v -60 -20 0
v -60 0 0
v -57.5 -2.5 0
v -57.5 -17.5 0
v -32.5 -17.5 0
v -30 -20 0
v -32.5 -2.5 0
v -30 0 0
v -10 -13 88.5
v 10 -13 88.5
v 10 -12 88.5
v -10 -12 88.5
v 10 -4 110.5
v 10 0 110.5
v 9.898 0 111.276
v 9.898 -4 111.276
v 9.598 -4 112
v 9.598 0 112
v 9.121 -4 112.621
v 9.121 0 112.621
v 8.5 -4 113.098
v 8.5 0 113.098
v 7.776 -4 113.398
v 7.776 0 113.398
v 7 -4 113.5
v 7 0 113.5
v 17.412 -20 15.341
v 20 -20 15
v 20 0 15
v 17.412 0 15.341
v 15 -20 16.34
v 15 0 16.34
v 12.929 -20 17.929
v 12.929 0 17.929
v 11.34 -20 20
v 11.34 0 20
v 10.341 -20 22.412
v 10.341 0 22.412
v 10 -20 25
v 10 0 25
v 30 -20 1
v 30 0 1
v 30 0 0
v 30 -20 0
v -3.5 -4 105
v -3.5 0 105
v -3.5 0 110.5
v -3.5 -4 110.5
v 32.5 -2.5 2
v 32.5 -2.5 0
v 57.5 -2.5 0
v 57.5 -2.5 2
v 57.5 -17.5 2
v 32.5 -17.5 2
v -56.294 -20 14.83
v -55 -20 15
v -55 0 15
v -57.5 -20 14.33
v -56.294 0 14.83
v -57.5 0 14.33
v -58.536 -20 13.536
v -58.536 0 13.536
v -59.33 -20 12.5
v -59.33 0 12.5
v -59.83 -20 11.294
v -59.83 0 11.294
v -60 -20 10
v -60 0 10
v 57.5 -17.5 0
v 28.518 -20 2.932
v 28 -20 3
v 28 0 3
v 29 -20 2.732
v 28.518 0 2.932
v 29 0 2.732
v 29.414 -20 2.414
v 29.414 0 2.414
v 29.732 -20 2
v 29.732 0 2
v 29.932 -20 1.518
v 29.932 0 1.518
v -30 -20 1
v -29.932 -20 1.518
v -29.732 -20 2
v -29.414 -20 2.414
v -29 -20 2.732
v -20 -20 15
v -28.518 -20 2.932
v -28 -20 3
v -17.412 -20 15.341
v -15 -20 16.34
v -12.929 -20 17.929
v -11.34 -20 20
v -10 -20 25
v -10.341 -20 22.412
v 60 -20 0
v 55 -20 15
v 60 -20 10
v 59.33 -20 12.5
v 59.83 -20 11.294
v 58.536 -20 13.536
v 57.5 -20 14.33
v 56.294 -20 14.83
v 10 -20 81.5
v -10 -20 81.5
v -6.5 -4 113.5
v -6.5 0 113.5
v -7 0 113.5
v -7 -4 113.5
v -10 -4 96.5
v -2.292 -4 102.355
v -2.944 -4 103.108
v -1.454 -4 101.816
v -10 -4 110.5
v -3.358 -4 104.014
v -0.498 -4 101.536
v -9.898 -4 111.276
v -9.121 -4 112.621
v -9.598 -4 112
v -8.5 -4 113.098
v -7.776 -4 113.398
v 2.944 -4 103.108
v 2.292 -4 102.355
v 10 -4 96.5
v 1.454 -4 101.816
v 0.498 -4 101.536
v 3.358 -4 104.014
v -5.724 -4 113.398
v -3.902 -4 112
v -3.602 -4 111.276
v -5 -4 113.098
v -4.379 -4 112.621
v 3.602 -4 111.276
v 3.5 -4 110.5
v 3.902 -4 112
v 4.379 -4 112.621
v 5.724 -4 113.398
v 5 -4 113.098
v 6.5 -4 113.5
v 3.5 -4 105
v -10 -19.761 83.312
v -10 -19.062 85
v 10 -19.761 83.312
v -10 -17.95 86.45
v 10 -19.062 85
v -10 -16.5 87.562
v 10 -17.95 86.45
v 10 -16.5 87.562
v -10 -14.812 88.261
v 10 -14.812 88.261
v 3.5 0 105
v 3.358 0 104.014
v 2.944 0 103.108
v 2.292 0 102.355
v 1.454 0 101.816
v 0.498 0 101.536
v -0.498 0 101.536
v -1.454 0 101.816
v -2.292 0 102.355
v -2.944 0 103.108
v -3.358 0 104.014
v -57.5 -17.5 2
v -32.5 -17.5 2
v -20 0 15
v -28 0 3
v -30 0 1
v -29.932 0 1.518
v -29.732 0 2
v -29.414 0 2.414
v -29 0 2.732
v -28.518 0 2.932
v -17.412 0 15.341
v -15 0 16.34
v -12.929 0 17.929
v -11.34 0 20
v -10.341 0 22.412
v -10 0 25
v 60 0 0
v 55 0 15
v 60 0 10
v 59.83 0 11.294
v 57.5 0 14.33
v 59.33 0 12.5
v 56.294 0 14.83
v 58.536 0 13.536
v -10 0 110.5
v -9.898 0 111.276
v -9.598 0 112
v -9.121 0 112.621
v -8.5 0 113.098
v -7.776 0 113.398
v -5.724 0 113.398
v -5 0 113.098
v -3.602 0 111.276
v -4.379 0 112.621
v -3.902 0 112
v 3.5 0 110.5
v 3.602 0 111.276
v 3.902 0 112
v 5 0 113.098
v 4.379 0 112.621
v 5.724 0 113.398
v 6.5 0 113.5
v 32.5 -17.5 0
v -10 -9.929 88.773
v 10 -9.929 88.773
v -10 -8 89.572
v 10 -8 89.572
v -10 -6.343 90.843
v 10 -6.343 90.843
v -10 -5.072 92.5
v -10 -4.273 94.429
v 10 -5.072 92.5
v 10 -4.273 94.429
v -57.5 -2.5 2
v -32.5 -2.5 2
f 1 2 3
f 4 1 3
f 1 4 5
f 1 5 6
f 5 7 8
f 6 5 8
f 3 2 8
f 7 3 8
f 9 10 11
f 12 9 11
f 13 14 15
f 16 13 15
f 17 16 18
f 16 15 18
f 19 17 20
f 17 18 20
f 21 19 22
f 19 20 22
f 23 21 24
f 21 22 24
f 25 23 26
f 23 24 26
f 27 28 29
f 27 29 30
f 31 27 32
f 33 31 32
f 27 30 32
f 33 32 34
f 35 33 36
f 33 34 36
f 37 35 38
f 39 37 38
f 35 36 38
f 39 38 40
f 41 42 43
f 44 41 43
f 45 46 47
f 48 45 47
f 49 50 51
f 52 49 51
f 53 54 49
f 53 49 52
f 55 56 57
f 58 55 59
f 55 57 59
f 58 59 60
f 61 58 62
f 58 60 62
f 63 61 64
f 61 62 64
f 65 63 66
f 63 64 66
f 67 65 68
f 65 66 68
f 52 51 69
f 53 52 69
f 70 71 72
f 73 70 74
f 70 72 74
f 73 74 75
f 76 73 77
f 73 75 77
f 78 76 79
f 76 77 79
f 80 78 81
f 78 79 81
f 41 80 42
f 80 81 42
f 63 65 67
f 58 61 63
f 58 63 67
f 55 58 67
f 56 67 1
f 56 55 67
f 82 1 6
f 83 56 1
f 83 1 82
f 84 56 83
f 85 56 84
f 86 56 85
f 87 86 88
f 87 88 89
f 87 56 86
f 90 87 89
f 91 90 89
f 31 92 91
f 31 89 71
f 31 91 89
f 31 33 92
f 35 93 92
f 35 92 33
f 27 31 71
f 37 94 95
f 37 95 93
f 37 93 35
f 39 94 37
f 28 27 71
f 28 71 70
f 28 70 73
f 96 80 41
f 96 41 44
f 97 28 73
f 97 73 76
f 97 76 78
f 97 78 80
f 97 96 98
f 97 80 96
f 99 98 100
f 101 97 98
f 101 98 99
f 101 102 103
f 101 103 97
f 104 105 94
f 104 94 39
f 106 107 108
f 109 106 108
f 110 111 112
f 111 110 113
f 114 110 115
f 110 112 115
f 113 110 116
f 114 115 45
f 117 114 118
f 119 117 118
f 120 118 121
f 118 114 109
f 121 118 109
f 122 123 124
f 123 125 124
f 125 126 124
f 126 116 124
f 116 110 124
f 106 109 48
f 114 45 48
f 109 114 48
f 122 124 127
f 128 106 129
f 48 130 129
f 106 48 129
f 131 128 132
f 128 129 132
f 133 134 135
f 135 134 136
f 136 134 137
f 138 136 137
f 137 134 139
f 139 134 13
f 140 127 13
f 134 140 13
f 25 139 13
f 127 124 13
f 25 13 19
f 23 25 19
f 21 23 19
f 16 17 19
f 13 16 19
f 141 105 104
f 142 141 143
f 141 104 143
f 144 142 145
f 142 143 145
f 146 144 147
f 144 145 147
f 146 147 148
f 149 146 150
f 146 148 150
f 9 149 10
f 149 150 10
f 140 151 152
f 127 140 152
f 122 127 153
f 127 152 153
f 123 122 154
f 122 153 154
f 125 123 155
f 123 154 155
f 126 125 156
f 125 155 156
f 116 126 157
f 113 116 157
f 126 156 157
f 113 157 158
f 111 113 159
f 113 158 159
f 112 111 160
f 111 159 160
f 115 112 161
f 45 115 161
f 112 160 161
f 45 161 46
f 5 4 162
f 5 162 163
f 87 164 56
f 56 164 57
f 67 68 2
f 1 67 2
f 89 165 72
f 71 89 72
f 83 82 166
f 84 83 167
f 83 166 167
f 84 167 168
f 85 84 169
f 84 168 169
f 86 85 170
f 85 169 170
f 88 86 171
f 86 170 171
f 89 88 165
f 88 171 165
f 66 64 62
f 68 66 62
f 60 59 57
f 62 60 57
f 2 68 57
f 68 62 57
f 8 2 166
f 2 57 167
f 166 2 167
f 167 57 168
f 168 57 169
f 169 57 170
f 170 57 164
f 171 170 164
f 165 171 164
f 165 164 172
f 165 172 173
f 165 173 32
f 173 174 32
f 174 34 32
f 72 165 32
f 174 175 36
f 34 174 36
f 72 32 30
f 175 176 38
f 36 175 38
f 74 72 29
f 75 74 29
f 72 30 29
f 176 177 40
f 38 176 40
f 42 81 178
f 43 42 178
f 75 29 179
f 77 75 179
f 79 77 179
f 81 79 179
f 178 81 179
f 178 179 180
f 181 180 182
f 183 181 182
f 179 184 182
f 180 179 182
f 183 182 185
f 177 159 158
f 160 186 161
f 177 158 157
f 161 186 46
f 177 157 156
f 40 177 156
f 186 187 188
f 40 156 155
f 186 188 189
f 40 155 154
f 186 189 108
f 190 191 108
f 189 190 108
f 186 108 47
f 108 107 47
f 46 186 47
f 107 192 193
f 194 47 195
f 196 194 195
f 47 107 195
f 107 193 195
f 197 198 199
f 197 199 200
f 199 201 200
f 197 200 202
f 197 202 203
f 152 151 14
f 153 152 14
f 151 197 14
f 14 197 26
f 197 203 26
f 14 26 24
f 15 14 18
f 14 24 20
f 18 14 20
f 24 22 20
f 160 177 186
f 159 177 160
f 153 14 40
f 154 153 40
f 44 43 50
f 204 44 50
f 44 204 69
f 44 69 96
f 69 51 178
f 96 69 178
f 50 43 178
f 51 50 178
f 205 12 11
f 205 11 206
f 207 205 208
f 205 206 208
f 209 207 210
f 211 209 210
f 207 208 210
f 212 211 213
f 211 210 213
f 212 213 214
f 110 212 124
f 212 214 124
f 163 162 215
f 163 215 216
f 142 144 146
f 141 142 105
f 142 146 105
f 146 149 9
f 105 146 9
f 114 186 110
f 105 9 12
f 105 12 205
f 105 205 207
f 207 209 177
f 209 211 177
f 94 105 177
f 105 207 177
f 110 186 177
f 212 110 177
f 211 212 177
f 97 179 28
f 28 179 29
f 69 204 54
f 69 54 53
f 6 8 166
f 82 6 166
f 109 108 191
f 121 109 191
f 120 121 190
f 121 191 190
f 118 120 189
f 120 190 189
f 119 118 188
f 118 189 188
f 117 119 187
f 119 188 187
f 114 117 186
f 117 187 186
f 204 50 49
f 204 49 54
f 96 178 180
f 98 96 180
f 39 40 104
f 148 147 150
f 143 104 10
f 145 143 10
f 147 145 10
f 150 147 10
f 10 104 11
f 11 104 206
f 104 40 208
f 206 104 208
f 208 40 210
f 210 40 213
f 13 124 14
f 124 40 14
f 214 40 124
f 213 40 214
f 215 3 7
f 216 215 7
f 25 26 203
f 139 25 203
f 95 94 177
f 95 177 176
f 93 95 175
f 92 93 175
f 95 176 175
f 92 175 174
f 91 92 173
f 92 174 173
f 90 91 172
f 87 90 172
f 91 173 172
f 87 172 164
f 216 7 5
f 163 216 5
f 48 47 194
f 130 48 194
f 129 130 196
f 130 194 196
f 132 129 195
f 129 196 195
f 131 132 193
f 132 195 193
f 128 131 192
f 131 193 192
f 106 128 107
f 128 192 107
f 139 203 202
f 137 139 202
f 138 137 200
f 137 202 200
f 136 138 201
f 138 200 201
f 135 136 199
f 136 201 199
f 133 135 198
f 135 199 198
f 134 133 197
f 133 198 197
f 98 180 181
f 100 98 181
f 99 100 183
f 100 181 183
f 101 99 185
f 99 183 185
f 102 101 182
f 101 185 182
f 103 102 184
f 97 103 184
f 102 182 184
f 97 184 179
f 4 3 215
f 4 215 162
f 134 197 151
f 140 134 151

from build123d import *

# Parameters (mm, degrees)
F1_DEPTH = 20
F3_DEPTH = 25
F4_W     = 25
F4_H     = 15
F5_DEPTH = 2


with BuildPart() as f1:
    # F0 (on Front) → F1 (new body)
    with BuildSketch(Plane.XZ):
        with BuildLine():
            ThreePointArc((3.5, 105), (0, 101.5), (-3.5, 105))
            Line((-3.5, 105), (-3.5, 110.5))
            ThreePointArc((-3.5, 110.5), (-4.37868, 112.62132), (-6.5, 113.5))
            Line((-6.5, 113.5), (-7, 113.5))
            ThreePointArc((-7, 113.5), (-9.12132, 112.62132), (-10, 110.5))
            Line((-10, 110.5), (-10, 25))
            ThreePointArc((-10, 25), (-12.928932, 17.928932), (-20, 15))
            Line((-20, 15), (-55, 15))
            ThreePointArc((-55, 15), (-58.535534, 13.535534), (-60, 10))
            Line((-60, 10), (-60, 0))
            Line((-60, 0), (-30, 0))
            Line((-30, 0), (-30, 1))
            ThreePointArc((-30, 1), (-29.414214, 2.414214), (-28, 3))
            Line((-28, 3), (28, 3))
            ThreePointArc((28, 3), (29.414214, 2.414214), (30, 1))
            Line((30, 1), (30, 0))
            Line((30, 0), (60, 0))
            Line((60, 0), (60, 10))
            ThreePointArc((60, 10), (58.535534, 13.535534), (55, 15))
            Line((55, 15), (20, 15))
            ThreePointArc((20, 15), (12.928932, 17.928932), (10, 25))
            Line((10, 25), (10, 110.5))
            ThreePointArc((10, 110.5), (9.12132, 112.62132), (7, 113.5))
            Line((7, 113.5), (6.5, 113.5))
            ThreePointArc((6.5, 113.5), (4.37868, 112.62132), (3.5, 110.5))
            Line((3.5, 110.5), (3.5, 105))
        make_face()
    extrude(amount=F1_DEPTH)

    # F2 (on face) → F3 (cut)
    with BuildSketch(Plane.YZ.offset(10)):
        Polygon((-4, 110.5), (-4, 116.603597), (-20, 116.603597), (-25.165081, 116.603597), (-25.165081, 79.442367), (-20, 79.442367), (-20, 81.5), (-20, 110.5), align=None)
        with BuildLine():
            Line((-4, 96.5), (-4, 110.5))
            Line((-4, 110.5), (-20, 110.5))
            Line((-20, 110.5), (-20, 81.5))
            ThreePointArc((-20, 81.5), (-17.949747, 86.449747), (-13, 88.5))
            Line((-13, 88.5), (-12, 88.5))
            ThreePointArc((-12, 88.5), (-6.343146, 90.843146), (-4, 96.5))
        make_face()
    extrude(amount=-F3_DEPTH, mode=Mode.SUBTRACT)

    # F4 (on face) → F5 (cut)
    with BuildSketch(Plane(origin=(0, 0, 0), x_dir=(1, 0, 0), z_dir=(0, 0, -1))):
        with Locations((-45, 10)):
            Rectangle(F4_W, F4_H)
        with Locations((45, 10)):
            Rectangle(F4_W, F4_H)
    extrude(amount=-F5_DEPTH, mode=Mode.SUBTRACT)


solid = f1.part
